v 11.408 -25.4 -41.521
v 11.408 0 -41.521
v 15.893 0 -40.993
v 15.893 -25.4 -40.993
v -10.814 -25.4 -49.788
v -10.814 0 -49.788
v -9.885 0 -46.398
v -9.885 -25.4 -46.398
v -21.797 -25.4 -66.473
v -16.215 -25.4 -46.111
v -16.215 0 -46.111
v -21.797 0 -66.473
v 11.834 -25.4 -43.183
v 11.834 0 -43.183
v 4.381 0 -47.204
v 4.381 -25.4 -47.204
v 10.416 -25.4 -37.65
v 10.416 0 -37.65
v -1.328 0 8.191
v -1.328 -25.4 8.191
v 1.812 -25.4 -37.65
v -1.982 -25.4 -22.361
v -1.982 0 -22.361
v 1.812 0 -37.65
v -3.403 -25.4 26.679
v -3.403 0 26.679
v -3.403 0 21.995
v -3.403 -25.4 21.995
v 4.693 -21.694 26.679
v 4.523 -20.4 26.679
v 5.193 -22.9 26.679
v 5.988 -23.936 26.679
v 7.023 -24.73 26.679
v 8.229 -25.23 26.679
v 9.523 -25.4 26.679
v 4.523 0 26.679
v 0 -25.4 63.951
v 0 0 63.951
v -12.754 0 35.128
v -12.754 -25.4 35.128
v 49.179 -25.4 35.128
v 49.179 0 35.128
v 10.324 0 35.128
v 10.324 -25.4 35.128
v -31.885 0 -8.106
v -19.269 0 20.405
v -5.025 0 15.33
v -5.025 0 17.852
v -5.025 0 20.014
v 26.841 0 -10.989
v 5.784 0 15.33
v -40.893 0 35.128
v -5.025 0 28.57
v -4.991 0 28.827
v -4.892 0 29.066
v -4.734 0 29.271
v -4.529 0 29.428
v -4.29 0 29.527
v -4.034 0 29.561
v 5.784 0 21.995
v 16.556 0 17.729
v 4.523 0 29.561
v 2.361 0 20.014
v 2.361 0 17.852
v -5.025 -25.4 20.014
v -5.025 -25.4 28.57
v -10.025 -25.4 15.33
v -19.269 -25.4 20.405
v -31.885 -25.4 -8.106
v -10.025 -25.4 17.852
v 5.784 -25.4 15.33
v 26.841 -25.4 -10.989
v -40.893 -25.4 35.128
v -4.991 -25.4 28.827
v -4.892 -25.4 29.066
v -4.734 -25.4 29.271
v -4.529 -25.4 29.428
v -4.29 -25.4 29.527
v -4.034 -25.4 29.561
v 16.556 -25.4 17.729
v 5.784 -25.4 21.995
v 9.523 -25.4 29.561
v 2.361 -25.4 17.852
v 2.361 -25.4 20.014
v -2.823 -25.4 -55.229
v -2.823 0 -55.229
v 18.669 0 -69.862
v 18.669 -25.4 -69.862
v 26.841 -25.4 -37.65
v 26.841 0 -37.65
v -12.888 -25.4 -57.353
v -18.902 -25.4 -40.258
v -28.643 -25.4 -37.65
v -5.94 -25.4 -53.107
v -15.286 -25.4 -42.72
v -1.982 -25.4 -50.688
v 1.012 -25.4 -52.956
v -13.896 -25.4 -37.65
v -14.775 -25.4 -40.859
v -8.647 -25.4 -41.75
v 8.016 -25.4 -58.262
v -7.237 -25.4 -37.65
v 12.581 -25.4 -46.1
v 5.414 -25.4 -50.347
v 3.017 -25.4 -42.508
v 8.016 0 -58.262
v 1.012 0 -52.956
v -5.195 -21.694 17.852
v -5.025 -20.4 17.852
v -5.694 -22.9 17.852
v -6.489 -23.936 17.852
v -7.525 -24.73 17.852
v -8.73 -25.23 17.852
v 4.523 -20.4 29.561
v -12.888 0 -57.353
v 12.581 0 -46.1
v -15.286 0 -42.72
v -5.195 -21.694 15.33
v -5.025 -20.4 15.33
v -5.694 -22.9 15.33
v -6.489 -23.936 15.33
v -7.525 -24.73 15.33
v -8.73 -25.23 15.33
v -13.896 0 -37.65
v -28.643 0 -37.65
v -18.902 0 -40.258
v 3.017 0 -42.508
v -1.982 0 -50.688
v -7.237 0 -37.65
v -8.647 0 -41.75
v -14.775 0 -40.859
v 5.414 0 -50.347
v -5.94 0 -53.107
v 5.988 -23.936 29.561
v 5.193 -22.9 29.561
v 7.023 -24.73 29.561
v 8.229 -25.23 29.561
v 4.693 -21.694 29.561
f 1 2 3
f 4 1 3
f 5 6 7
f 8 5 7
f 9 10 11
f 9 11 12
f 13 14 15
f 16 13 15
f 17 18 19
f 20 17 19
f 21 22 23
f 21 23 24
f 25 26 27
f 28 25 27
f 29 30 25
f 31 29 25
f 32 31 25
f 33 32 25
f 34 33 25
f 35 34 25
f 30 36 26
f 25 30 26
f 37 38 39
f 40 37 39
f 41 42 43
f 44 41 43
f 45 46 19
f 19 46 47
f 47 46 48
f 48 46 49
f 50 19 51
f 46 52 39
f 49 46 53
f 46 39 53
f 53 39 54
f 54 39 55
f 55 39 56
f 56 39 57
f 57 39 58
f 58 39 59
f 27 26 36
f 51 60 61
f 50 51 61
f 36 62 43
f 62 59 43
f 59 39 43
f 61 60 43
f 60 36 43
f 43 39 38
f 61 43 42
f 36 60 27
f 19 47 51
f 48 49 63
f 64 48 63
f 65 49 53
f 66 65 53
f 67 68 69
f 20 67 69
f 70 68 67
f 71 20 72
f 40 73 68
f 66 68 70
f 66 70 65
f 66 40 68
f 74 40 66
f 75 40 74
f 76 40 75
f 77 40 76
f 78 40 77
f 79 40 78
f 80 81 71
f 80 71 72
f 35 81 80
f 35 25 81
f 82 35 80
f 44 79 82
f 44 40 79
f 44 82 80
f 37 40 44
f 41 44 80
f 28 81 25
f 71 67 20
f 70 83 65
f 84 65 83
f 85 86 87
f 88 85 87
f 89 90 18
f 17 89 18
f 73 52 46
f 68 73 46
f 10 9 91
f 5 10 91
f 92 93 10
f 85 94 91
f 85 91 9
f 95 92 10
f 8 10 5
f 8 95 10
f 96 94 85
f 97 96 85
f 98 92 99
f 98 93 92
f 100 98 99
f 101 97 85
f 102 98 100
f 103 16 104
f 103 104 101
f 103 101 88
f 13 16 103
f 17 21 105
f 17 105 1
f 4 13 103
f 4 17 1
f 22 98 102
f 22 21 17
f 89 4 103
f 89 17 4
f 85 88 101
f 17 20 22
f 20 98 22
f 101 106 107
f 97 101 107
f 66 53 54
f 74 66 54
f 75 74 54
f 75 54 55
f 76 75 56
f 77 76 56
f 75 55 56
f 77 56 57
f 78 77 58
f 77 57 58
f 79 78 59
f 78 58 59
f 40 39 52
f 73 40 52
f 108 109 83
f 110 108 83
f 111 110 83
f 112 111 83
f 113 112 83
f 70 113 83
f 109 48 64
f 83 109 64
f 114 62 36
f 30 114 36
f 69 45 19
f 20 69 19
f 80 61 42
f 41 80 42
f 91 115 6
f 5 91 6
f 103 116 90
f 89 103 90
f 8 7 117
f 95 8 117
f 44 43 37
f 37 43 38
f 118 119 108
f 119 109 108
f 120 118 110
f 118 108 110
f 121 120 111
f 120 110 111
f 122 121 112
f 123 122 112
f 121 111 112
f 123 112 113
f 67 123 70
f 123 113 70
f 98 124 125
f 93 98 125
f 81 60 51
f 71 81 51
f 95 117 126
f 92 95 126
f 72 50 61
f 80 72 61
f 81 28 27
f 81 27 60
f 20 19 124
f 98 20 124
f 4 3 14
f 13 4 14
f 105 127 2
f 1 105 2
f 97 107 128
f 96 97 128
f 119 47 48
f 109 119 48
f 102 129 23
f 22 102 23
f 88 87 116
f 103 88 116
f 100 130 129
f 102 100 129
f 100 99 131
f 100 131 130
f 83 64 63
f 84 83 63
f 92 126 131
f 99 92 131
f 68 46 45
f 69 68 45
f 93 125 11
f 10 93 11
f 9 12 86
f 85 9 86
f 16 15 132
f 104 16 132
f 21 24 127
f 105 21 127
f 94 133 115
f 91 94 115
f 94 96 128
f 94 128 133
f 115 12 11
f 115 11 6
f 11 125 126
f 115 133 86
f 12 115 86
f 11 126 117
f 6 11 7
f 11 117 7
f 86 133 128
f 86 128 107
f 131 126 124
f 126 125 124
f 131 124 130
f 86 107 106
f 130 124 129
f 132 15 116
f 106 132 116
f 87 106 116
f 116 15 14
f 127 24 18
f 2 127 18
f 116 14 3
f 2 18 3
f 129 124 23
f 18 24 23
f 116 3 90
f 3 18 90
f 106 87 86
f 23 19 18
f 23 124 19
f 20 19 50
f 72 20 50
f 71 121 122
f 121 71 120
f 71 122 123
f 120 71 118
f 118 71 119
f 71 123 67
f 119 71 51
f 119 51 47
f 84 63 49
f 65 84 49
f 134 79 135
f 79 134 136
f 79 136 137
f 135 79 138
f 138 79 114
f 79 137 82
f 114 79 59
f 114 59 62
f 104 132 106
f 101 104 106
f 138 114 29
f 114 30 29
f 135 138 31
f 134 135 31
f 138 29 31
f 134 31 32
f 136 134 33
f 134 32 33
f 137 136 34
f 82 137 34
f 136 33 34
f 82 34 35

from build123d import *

# Parameters (mm, degrees)
F1_DEPTH = 25.4
F2_R     = 5


with BuildPart() as f1:
    # F0 (on Front) → F1 (new body)
    with BuildSketch(Plane.XZ):
        Polygon((49.1790995002, 35.1279303432), (46.2968088686, 35.1279303432), (10.3235928391, 35.1279303432), (16.5555316669, 17.7286936407), align=None)
        Polygon((16.5555316669, 17.7286936407), (10.3235928391, 35.1279303432), (-12.7541388096, 35.1279303432), (-19.2688434451, 20.4054333779), (-1.3283445484, 8.1906260382), align=None)
        with BuildLine():
            Line((4.523080308, 26.6788955778), (-3.4032228868, 26.6788955778))
            Line((-3.4032228868, 26.6788955778), (-3.4032228868, 21.9951700419))
            Line((-3.4032228868, 21.9951700419), (5.7840845548, 21.9951700419))
            Line((5.7840845548, 21.9951700419), (5.7840845548, 15.3298713267))
            Line((5.7840845548, 15.3298713267), (-5.0245104358, 15.3298713267))
            Line((-5.0245104358, 15.3298713267), (-5.0245104358, 17.8518760949))
            Line((-5.0245104358, 17.8518760949), (2.361360006, 17.8518760949))
            Line((2.361360006, 17.8518760949), (2.361360006, 20.0135931373))
            Line((2.361360006, 20.0135931373), (-5.0245104358, 20.0135931373))
            Line((-5.0245104358, 20.0135931373), (-5.0245104358, 28.5703968839))
            ThreePointArc((-5.0245104358, 28.5703968839), (-4.7343155066, 29.2709894175), (-4.033722973, 29.5611843467))
            Line((-4.033722973, 29.5611843467), (4.523080308, 29.5611843467))
            Line((4.523080308, 29.5611843467), (4.523080308, 26.6788955778))
        make_face(mode=Mode.SUBTRACT)
        Polygon((-12.7541388096, 35.1279303432), (10.3235928391, 35.1279303432), (0, 63.9508441091), align=None)
        Polygon((-19.2688434451, 20.4054333779), (-12.7541388096, 35.1279303432), (-40.8925116062, 35.1279303432), align=None)
        Polygon((26.8413424492, -10.9887346625), (16.5555316669, 17.7286936407), (-1.3283445484, 8.1906260382), align=None)
        Polygon((-1.3283445484, 8.1906260382), (-19.2688434451, 20.4054333779), (-31.8853482604, -8.1064430997), align=None)
    extrude(amount=F1_DEPTH)

    # F2
    f2_edges = [f1.edges().sort_by_distance(p)[0] for p in [
        (4.52308, -25.4, 28.12004),
        (-5.02451, -25.4, 16.590874),
    ]]
    fillet(f2_edges, radius=F2_R)


with BuildPart() as f1b:
    # F0 (on Front) → F1, piece 2 (new body)
    with BuildSketch(Plane.XZ):
        Polygon((10.4162836419, -37.6499332488), (-1.3283445484, 8.1906260382), (-13.8955292601, -37.6499332488), (-7.2372480791, -37.6499332488), (-1.9815720152, -22.360695526), (1.8119977779, -37.6499332488), align=None)
        Polygon((11.4079817904, -41.5206388203), (10.4162836419, -37.6499332488), (1.8119977779, -37.6499332488), (3.0173268169, -42.5077751279), align=None)
        Polygon((26.8413424492, -37.6499332488), (10.4162836419, -37.6499332488), (11.4079817904, -41.5206388203), (15.8932786435, -40.9929566085), (11.8338640357, -43.1829034745), (12.5813226534, -46.1003156331), align=None)
        Polygon((-14.7752227033, -40.8587377953), (-13.8955292601, -37.6499332488), (-28.6427699029, -37.6499332488), (-16.2152002989, -46.1112569437), (-15.2856142355, -42.7204621056), (-18.9018275167, -40.2583595308), align=None)
        Polygon((-7.2372480791, -37.6499332488), (-13.8955292601, -37.6499332488), (-14.7752227033, -40.8587377953), (-8.6467713118, -41.7503640056), align=None)
        Polygon((5.4142316133, -50.3474808362), (12.5813226534, -46.1003156331), (11.8338640357, -43.1829034745), (4.3806629255, -47.2037084401), align=None)
        Polygon((18.6693164167, -69.8624164442), (12.5813226534, -46.1003156331), (5.4142316133, -50.3474808362), (8.0162258819, -58.2618825138), (1.0124164531, -52.9559639815), (-2.8234295545, -55.2290579881), align=None)
        Polygon((-15.2856142355, -42.7204621056), (-16.2152002989, -46.1112569437), (-10.8144243158, -49.7883808909), (-9.8848382524, -46.3975860528), align=None)
        Polygon((-10.8144243158, -49.7883808909), (-16.2152002989, -46.1112569437), (-21.7973291874, -66.47285074), (-2.8234295545, -55.2290579881), (-5.9402384881, -53.1069753828), (-12.888261117, -57.352989912), align=None)
        Polygon((-5.9402384881, -53.1069753828), (-2.8234295545, -55.2290579881), (1.0124164531, -52.9559639815), (-1.9815720152, -50.687789917), align=None)
    extrude(amount=F1_DEPTH)


solid = Compound([f1.part, f1b.part])
